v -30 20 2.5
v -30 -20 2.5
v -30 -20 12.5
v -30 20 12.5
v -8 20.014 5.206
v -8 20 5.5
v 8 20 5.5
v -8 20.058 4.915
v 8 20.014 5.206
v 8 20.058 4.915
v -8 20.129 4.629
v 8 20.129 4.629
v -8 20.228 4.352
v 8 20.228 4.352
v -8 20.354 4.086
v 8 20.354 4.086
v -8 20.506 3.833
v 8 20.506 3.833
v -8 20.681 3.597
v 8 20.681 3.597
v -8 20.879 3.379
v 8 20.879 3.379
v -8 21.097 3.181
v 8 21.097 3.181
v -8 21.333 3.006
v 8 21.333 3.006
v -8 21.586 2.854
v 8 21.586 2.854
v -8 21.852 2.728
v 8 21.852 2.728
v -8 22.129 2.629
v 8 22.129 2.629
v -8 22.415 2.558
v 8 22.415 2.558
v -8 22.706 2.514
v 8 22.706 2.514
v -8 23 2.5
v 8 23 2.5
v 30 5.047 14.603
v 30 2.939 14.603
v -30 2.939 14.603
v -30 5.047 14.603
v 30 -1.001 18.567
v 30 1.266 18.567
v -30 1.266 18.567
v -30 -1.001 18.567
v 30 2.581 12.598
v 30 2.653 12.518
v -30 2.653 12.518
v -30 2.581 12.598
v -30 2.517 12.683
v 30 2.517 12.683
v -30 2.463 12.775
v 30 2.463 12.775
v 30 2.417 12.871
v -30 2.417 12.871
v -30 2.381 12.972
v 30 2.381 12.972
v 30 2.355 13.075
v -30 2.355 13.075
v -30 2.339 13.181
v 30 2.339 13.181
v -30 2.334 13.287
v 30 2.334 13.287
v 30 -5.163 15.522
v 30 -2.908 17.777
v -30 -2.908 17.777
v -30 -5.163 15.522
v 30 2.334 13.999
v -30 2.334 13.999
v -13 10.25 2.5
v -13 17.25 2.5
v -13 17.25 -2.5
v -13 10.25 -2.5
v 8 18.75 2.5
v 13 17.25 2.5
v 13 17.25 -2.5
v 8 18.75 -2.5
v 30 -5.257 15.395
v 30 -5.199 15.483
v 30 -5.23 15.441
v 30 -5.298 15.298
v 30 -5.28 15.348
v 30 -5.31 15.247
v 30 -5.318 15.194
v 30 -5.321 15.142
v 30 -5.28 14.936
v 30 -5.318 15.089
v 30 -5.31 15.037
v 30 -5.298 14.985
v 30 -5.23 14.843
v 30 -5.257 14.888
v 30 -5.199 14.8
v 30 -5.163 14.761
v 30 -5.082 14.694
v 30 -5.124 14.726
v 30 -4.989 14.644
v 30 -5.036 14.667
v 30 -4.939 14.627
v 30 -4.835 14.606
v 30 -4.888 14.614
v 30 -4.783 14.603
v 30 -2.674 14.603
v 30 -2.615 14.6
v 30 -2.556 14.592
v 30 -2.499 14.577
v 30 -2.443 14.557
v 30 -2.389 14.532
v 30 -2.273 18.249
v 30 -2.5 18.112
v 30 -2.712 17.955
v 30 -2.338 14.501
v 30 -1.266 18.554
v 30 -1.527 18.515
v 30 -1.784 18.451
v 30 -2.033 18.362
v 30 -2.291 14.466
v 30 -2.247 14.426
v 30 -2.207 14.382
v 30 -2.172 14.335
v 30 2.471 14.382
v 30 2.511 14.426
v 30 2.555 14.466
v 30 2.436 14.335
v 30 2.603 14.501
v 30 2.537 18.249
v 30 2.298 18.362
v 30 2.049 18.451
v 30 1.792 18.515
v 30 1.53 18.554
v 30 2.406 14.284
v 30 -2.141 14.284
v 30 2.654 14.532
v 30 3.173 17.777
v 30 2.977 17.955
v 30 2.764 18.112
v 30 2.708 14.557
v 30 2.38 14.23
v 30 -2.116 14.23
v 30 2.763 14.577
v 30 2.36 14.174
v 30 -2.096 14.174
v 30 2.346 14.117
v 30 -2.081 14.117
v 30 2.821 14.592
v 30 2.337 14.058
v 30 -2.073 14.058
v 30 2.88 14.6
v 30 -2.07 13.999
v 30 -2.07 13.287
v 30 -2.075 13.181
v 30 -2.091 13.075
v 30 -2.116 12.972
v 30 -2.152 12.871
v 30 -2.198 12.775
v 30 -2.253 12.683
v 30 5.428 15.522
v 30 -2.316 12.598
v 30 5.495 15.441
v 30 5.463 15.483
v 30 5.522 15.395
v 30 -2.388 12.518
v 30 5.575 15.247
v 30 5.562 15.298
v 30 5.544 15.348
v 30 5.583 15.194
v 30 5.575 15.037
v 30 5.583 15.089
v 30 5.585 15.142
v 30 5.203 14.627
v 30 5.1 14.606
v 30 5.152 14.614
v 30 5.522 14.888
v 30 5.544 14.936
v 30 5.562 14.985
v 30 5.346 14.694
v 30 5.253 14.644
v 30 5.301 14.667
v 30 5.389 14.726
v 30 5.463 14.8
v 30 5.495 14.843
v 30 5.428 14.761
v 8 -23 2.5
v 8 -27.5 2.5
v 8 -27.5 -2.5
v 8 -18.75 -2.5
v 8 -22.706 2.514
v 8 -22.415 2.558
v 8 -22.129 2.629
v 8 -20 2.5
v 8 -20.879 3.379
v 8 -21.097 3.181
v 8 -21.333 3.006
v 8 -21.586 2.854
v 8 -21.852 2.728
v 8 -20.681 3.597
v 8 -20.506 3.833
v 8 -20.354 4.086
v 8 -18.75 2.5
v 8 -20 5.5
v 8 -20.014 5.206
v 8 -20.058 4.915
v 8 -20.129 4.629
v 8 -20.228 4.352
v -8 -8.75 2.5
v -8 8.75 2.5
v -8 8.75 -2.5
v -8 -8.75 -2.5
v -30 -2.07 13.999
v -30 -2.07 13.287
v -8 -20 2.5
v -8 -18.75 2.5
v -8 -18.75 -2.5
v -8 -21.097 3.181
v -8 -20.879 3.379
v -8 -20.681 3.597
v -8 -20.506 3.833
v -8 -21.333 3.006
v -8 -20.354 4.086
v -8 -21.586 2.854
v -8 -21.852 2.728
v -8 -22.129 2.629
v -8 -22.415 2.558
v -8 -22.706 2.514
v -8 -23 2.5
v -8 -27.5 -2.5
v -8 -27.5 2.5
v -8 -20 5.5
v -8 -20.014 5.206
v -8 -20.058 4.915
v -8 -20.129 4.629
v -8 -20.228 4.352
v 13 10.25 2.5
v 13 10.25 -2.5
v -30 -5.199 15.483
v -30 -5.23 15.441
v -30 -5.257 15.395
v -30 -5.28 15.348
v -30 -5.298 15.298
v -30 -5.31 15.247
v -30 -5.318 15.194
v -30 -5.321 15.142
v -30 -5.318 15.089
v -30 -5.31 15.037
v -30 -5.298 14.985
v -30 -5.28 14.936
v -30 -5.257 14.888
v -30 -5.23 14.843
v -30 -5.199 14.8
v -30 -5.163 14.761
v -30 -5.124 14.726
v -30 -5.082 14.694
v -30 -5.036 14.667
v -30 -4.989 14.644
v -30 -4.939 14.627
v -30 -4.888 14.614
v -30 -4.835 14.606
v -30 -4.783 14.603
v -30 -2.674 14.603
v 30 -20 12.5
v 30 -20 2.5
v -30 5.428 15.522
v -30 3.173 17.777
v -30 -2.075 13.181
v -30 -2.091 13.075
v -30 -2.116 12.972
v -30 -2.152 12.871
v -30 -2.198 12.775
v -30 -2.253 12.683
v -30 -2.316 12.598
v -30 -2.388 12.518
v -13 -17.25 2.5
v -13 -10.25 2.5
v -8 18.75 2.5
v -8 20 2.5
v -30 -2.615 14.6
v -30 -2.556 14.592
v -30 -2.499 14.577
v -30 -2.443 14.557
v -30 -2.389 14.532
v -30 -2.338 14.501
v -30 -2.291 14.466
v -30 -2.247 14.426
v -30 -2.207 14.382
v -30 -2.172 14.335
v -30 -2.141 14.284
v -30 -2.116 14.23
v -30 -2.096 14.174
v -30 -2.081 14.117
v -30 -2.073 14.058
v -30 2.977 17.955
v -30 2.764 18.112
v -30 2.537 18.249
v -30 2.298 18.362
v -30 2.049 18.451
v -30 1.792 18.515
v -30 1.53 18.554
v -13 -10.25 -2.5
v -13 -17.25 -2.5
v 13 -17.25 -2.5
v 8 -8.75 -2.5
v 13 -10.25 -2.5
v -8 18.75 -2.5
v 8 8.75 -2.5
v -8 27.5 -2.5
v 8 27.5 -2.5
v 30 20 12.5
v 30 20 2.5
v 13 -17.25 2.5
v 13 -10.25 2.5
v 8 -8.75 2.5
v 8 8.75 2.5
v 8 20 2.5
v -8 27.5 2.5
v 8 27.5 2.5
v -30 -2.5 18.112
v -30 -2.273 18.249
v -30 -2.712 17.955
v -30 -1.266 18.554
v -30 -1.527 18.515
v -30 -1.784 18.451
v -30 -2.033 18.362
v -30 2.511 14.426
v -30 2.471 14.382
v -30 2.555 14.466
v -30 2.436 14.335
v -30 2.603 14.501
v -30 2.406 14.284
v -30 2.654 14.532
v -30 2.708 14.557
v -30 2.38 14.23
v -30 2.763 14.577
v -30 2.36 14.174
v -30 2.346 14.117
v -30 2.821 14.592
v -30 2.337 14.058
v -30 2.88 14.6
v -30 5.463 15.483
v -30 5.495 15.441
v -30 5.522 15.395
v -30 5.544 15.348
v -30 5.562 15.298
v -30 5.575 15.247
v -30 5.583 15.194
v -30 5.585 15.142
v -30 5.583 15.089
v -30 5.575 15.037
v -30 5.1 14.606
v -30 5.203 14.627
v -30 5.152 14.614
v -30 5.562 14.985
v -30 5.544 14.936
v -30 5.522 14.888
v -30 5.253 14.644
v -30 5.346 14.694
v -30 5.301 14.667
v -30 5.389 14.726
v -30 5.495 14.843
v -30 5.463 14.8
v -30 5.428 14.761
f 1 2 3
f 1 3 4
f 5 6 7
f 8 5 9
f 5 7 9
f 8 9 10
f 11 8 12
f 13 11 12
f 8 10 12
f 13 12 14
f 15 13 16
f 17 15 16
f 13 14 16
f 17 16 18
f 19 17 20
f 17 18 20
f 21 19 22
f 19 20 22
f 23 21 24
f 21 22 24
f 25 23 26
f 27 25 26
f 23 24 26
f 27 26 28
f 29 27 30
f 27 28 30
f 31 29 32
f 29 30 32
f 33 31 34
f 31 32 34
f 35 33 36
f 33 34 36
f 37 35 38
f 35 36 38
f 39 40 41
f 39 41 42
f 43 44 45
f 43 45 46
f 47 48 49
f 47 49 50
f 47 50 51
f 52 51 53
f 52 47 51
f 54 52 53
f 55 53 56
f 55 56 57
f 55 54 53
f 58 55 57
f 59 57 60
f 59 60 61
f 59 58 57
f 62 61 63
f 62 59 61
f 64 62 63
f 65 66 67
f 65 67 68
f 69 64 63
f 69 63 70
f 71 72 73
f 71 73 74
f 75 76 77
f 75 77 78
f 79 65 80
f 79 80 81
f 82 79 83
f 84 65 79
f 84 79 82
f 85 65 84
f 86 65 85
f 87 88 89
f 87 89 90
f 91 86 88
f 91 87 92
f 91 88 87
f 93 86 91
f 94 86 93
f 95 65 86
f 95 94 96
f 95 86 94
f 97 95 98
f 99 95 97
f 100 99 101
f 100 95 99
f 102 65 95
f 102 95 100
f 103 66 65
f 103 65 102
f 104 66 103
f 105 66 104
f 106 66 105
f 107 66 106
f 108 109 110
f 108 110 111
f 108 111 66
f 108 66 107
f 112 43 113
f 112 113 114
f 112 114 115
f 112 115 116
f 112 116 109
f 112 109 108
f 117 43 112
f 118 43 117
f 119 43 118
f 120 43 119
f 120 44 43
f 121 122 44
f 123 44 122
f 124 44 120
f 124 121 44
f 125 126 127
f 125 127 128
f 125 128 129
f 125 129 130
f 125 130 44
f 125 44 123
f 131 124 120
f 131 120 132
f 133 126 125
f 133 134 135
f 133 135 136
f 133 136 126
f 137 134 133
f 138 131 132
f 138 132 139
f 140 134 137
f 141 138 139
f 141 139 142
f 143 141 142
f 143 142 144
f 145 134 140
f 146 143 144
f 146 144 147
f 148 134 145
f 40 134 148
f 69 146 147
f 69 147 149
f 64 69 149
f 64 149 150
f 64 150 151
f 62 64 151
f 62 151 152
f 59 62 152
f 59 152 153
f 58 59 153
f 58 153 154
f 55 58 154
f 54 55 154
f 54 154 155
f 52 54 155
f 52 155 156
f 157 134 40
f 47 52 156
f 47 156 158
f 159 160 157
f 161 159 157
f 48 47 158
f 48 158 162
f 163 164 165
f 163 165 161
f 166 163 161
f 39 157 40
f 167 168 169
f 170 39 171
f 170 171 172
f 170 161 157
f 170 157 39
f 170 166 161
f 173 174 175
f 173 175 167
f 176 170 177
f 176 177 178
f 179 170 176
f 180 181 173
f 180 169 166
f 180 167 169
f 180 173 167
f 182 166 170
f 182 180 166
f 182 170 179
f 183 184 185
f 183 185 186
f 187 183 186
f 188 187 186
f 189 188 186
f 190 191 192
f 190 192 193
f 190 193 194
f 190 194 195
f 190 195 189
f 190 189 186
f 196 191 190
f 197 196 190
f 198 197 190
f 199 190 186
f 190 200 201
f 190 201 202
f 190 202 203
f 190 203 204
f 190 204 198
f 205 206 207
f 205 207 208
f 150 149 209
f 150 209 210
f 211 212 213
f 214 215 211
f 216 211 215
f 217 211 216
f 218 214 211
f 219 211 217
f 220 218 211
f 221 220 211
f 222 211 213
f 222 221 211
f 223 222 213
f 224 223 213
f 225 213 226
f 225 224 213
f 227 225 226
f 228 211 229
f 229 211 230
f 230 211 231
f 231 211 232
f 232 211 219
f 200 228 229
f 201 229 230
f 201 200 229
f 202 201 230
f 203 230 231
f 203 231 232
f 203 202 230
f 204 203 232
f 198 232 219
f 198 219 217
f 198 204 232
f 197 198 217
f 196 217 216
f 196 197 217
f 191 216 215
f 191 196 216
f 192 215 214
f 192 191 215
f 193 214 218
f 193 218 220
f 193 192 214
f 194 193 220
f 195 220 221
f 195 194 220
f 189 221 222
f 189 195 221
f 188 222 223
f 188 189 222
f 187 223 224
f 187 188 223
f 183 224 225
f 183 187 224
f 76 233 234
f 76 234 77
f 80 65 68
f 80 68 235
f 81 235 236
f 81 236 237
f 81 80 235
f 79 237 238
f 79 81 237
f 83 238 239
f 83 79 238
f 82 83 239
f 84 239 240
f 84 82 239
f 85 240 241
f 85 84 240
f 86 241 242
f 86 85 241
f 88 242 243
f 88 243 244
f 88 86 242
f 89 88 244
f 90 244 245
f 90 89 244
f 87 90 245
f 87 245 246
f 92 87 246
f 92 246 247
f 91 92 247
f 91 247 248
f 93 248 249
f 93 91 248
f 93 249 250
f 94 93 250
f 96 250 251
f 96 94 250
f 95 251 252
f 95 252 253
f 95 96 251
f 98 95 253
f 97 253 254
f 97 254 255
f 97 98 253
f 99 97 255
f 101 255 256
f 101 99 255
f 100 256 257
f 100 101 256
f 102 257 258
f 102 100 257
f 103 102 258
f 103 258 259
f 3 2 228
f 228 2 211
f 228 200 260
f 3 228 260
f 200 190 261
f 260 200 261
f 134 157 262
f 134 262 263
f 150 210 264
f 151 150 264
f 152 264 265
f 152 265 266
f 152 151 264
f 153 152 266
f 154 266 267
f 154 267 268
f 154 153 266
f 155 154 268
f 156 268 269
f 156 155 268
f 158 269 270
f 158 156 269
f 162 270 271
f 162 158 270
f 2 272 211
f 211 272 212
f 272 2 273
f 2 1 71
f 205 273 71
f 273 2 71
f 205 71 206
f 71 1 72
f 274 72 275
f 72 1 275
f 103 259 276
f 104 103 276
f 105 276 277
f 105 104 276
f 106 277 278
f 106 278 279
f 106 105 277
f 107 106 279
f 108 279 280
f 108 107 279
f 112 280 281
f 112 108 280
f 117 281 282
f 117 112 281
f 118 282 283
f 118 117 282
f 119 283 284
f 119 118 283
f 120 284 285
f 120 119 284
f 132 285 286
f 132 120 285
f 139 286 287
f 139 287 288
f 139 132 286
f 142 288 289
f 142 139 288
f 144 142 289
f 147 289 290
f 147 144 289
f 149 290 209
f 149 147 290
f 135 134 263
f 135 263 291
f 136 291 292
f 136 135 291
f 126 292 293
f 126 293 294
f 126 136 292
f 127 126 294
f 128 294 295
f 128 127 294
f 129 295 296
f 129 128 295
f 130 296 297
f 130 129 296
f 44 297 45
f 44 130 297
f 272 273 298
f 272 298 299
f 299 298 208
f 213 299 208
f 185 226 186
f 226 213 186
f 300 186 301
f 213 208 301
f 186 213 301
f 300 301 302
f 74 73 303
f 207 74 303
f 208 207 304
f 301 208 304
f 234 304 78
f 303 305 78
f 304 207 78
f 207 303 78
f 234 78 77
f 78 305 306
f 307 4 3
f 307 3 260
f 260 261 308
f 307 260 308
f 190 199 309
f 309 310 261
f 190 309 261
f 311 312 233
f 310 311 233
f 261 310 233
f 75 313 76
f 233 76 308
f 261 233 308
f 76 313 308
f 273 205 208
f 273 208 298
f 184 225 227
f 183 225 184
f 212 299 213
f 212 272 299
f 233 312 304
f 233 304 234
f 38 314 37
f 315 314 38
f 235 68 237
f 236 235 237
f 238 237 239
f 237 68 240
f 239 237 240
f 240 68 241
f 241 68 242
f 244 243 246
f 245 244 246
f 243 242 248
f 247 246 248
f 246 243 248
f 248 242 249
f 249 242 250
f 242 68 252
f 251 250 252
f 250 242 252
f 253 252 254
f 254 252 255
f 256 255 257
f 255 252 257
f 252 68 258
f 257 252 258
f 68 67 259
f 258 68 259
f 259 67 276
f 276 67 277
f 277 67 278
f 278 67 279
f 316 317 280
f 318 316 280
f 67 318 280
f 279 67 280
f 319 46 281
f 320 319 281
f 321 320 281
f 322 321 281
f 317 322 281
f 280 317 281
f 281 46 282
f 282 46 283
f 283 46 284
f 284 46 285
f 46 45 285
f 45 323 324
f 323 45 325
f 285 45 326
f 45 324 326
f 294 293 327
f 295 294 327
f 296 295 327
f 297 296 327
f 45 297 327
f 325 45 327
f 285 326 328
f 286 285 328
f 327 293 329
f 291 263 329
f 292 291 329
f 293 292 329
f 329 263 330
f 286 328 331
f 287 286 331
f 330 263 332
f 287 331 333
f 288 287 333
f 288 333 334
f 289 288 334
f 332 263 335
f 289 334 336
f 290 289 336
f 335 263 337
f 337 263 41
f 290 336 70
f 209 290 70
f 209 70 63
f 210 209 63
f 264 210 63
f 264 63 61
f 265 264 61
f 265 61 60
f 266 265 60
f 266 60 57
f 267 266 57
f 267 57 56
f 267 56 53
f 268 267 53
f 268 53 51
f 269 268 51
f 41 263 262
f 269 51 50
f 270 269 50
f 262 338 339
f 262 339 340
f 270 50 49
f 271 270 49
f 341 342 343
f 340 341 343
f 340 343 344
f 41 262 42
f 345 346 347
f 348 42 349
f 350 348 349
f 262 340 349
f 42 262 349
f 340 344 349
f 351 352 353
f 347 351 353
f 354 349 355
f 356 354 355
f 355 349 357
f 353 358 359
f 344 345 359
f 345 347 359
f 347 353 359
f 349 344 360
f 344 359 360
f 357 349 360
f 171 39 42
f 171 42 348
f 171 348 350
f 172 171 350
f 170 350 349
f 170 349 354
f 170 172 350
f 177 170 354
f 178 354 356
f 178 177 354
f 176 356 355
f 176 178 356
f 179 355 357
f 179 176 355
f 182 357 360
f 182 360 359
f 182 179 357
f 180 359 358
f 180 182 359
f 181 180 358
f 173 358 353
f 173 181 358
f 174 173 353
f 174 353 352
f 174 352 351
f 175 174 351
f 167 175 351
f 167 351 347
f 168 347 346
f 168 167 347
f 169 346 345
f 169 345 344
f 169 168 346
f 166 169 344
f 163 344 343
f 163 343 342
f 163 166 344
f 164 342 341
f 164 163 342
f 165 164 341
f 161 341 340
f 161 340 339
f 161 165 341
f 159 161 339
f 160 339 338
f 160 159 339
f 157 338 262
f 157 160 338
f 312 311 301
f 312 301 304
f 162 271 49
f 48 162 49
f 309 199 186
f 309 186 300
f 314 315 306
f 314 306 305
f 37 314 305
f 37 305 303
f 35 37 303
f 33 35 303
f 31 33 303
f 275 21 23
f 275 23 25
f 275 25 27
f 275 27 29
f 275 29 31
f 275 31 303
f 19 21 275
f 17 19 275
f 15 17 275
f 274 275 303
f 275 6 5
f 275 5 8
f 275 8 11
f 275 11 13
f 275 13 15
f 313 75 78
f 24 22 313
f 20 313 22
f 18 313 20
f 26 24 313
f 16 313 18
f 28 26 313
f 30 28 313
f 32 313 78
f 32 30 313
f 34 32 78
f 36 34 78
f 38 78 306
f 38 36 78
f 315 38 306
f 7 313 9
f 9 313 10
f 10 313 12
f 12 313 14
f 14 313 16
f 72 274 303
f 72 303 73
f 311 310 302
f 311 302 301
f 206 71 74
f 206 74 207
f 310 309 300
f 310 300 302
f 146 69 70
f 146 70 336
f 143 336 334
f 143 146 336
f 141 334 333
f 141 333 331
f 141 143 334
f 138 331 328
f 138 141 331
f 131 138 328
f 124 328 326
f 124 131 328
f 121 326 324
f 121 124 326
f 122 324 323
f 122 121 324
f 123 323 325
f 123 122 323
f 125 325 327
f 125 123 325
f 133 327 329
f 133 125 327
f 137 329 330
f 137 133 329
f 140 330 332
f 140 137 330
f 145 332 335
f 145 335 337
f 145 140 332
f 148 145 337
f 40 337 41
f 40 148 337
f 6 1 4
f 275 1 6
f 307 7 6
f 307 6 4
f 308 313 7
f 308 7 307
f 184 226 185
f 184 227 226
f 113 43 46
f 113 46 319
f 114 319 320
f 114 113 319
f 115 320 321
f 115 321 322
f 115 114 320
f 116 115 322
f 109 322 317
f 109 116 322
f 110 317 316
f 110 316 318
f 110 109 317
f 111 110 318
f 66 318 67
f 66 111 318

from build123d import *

# Parameters (mm, degrees)
BOSS_EXTRUDE1_DEPTH = 2.5
SKETCH3_W           = 60
SKETCH3_H           = 40
BOSS_EXTRUDE2_DEPTH = 10
BOSS_EXTRUDE3_DEPTH = 60
FILLET4_R           = 3


with BuildPart() as part:
    # Sketch2 → Boss-Extrude1 (new, symmetric)
    with BuildSketch(Plane.XY):
        Polygon((-8, -27.5), (8, -27.5), (8, -18.75), (13, -17.25), (13, -10.25), (8, -8.75), (8, 8.75), (13, 10.25), (13, 17.25), (8, 18.75), (8, 27.5), (-8, 27.5), (-8, 18.75), (-13, 17.25), (-13, 10.25), (-8, 8.75), (-8, -8.75), (-13, -10.25), (-13, -17.25), (-8, -18.75), align=None)
    extrude(amount=BOSS_EXTRUDE1_DEPTH, both=True)

    # Sketch3 → Boss-Extrude2 (add)
    with BuildSketch(Plane.XY.offset(2.5)):
        Rectangle(SKETCH3_W, SKETCH3_H)
    extrude(amount=BOSS_EXTRUDE2_DEPTH)

    # Fillet4
    fillet4_edges = [part.edges().sort_by_distance(p)[0] for p in [
        (0, -20, 2.5),
        (0, 20, 2.5),
    ]]
    fillet(fillet4_edges, radius=FILLET4_R)


with BuildPart() as body_2:
    # Sketch5 → Boss-Extrude3 (new, through all)
    with BuildSketch(Plane(origin=(30, 0, 0), x_dir=(0, 0, -1), z_dir=(1, 0, 0))):
        with BuildLine():
            ThreePointArc((-14.6034, 5.0471626), (-14.935639777, 5.544394565), (-15.52216487, 5.42772747))
            Line((-15.52216487, 5.42772747), (-17.777002218, 3.172890121))
            ThreePointArc((-17.777002218, 3.172890121), (-18.361681683, 2.297855465), (-18.566993808, 1.265681711))
            Line((-18.566993808, 1.265681711), (-18.566993808, -1.001156511))
            ThreePointArc((-18.566993808, -1.001156511), (-18.361681683, -2.033330264), (-17.777002218, -2.908364921))
            Line((-17.777002218, -2.908364921), (-15.52216487, -5.163202269))
            ThreePointArc((-15.52216487, -5.163202269), (-14.935639777, -5.279869364), (-14.6034, -4.7826374))
            Line((-14.6034, -4.7826374), (-14.6034, -2.6744374))
            ThreePointArc((-14.6034, -2.6744374), (-14.426258181, -2.246779218), (-13.9986, -2.0696374))
            Line((-13.9986, -2.0696374), (-13.2874, -2.0696374))
            ThreePointArc((-13.2874, -2.0696374), (-12.871270036, -2.152410796), (-12.518492086, -2.388129486))
            Line((-12.518492086, -2.388129486), (-12.518492086, 2.652654686))
            ThreePointArc((-12.518492086, 2.652654686), (-12.871270036, 2.416935997), (-13.2874, 2.3341626))
            Line((-13.2874, 2.3341626), (-13.9986, 2.3341626))
            ThreePointArc((-13.9986, 2.3341626), (-14.426258181, 2.511304419), (-14.6034, 2.9389626))
            Line((-14.6034, 2.9389626), (-14.6034, 5.0471626))
        make_face()
    extrude(amount=-BOSS_EXTRUDE3_DEPTH)


solid = Compound([part.part, body_2.part])
